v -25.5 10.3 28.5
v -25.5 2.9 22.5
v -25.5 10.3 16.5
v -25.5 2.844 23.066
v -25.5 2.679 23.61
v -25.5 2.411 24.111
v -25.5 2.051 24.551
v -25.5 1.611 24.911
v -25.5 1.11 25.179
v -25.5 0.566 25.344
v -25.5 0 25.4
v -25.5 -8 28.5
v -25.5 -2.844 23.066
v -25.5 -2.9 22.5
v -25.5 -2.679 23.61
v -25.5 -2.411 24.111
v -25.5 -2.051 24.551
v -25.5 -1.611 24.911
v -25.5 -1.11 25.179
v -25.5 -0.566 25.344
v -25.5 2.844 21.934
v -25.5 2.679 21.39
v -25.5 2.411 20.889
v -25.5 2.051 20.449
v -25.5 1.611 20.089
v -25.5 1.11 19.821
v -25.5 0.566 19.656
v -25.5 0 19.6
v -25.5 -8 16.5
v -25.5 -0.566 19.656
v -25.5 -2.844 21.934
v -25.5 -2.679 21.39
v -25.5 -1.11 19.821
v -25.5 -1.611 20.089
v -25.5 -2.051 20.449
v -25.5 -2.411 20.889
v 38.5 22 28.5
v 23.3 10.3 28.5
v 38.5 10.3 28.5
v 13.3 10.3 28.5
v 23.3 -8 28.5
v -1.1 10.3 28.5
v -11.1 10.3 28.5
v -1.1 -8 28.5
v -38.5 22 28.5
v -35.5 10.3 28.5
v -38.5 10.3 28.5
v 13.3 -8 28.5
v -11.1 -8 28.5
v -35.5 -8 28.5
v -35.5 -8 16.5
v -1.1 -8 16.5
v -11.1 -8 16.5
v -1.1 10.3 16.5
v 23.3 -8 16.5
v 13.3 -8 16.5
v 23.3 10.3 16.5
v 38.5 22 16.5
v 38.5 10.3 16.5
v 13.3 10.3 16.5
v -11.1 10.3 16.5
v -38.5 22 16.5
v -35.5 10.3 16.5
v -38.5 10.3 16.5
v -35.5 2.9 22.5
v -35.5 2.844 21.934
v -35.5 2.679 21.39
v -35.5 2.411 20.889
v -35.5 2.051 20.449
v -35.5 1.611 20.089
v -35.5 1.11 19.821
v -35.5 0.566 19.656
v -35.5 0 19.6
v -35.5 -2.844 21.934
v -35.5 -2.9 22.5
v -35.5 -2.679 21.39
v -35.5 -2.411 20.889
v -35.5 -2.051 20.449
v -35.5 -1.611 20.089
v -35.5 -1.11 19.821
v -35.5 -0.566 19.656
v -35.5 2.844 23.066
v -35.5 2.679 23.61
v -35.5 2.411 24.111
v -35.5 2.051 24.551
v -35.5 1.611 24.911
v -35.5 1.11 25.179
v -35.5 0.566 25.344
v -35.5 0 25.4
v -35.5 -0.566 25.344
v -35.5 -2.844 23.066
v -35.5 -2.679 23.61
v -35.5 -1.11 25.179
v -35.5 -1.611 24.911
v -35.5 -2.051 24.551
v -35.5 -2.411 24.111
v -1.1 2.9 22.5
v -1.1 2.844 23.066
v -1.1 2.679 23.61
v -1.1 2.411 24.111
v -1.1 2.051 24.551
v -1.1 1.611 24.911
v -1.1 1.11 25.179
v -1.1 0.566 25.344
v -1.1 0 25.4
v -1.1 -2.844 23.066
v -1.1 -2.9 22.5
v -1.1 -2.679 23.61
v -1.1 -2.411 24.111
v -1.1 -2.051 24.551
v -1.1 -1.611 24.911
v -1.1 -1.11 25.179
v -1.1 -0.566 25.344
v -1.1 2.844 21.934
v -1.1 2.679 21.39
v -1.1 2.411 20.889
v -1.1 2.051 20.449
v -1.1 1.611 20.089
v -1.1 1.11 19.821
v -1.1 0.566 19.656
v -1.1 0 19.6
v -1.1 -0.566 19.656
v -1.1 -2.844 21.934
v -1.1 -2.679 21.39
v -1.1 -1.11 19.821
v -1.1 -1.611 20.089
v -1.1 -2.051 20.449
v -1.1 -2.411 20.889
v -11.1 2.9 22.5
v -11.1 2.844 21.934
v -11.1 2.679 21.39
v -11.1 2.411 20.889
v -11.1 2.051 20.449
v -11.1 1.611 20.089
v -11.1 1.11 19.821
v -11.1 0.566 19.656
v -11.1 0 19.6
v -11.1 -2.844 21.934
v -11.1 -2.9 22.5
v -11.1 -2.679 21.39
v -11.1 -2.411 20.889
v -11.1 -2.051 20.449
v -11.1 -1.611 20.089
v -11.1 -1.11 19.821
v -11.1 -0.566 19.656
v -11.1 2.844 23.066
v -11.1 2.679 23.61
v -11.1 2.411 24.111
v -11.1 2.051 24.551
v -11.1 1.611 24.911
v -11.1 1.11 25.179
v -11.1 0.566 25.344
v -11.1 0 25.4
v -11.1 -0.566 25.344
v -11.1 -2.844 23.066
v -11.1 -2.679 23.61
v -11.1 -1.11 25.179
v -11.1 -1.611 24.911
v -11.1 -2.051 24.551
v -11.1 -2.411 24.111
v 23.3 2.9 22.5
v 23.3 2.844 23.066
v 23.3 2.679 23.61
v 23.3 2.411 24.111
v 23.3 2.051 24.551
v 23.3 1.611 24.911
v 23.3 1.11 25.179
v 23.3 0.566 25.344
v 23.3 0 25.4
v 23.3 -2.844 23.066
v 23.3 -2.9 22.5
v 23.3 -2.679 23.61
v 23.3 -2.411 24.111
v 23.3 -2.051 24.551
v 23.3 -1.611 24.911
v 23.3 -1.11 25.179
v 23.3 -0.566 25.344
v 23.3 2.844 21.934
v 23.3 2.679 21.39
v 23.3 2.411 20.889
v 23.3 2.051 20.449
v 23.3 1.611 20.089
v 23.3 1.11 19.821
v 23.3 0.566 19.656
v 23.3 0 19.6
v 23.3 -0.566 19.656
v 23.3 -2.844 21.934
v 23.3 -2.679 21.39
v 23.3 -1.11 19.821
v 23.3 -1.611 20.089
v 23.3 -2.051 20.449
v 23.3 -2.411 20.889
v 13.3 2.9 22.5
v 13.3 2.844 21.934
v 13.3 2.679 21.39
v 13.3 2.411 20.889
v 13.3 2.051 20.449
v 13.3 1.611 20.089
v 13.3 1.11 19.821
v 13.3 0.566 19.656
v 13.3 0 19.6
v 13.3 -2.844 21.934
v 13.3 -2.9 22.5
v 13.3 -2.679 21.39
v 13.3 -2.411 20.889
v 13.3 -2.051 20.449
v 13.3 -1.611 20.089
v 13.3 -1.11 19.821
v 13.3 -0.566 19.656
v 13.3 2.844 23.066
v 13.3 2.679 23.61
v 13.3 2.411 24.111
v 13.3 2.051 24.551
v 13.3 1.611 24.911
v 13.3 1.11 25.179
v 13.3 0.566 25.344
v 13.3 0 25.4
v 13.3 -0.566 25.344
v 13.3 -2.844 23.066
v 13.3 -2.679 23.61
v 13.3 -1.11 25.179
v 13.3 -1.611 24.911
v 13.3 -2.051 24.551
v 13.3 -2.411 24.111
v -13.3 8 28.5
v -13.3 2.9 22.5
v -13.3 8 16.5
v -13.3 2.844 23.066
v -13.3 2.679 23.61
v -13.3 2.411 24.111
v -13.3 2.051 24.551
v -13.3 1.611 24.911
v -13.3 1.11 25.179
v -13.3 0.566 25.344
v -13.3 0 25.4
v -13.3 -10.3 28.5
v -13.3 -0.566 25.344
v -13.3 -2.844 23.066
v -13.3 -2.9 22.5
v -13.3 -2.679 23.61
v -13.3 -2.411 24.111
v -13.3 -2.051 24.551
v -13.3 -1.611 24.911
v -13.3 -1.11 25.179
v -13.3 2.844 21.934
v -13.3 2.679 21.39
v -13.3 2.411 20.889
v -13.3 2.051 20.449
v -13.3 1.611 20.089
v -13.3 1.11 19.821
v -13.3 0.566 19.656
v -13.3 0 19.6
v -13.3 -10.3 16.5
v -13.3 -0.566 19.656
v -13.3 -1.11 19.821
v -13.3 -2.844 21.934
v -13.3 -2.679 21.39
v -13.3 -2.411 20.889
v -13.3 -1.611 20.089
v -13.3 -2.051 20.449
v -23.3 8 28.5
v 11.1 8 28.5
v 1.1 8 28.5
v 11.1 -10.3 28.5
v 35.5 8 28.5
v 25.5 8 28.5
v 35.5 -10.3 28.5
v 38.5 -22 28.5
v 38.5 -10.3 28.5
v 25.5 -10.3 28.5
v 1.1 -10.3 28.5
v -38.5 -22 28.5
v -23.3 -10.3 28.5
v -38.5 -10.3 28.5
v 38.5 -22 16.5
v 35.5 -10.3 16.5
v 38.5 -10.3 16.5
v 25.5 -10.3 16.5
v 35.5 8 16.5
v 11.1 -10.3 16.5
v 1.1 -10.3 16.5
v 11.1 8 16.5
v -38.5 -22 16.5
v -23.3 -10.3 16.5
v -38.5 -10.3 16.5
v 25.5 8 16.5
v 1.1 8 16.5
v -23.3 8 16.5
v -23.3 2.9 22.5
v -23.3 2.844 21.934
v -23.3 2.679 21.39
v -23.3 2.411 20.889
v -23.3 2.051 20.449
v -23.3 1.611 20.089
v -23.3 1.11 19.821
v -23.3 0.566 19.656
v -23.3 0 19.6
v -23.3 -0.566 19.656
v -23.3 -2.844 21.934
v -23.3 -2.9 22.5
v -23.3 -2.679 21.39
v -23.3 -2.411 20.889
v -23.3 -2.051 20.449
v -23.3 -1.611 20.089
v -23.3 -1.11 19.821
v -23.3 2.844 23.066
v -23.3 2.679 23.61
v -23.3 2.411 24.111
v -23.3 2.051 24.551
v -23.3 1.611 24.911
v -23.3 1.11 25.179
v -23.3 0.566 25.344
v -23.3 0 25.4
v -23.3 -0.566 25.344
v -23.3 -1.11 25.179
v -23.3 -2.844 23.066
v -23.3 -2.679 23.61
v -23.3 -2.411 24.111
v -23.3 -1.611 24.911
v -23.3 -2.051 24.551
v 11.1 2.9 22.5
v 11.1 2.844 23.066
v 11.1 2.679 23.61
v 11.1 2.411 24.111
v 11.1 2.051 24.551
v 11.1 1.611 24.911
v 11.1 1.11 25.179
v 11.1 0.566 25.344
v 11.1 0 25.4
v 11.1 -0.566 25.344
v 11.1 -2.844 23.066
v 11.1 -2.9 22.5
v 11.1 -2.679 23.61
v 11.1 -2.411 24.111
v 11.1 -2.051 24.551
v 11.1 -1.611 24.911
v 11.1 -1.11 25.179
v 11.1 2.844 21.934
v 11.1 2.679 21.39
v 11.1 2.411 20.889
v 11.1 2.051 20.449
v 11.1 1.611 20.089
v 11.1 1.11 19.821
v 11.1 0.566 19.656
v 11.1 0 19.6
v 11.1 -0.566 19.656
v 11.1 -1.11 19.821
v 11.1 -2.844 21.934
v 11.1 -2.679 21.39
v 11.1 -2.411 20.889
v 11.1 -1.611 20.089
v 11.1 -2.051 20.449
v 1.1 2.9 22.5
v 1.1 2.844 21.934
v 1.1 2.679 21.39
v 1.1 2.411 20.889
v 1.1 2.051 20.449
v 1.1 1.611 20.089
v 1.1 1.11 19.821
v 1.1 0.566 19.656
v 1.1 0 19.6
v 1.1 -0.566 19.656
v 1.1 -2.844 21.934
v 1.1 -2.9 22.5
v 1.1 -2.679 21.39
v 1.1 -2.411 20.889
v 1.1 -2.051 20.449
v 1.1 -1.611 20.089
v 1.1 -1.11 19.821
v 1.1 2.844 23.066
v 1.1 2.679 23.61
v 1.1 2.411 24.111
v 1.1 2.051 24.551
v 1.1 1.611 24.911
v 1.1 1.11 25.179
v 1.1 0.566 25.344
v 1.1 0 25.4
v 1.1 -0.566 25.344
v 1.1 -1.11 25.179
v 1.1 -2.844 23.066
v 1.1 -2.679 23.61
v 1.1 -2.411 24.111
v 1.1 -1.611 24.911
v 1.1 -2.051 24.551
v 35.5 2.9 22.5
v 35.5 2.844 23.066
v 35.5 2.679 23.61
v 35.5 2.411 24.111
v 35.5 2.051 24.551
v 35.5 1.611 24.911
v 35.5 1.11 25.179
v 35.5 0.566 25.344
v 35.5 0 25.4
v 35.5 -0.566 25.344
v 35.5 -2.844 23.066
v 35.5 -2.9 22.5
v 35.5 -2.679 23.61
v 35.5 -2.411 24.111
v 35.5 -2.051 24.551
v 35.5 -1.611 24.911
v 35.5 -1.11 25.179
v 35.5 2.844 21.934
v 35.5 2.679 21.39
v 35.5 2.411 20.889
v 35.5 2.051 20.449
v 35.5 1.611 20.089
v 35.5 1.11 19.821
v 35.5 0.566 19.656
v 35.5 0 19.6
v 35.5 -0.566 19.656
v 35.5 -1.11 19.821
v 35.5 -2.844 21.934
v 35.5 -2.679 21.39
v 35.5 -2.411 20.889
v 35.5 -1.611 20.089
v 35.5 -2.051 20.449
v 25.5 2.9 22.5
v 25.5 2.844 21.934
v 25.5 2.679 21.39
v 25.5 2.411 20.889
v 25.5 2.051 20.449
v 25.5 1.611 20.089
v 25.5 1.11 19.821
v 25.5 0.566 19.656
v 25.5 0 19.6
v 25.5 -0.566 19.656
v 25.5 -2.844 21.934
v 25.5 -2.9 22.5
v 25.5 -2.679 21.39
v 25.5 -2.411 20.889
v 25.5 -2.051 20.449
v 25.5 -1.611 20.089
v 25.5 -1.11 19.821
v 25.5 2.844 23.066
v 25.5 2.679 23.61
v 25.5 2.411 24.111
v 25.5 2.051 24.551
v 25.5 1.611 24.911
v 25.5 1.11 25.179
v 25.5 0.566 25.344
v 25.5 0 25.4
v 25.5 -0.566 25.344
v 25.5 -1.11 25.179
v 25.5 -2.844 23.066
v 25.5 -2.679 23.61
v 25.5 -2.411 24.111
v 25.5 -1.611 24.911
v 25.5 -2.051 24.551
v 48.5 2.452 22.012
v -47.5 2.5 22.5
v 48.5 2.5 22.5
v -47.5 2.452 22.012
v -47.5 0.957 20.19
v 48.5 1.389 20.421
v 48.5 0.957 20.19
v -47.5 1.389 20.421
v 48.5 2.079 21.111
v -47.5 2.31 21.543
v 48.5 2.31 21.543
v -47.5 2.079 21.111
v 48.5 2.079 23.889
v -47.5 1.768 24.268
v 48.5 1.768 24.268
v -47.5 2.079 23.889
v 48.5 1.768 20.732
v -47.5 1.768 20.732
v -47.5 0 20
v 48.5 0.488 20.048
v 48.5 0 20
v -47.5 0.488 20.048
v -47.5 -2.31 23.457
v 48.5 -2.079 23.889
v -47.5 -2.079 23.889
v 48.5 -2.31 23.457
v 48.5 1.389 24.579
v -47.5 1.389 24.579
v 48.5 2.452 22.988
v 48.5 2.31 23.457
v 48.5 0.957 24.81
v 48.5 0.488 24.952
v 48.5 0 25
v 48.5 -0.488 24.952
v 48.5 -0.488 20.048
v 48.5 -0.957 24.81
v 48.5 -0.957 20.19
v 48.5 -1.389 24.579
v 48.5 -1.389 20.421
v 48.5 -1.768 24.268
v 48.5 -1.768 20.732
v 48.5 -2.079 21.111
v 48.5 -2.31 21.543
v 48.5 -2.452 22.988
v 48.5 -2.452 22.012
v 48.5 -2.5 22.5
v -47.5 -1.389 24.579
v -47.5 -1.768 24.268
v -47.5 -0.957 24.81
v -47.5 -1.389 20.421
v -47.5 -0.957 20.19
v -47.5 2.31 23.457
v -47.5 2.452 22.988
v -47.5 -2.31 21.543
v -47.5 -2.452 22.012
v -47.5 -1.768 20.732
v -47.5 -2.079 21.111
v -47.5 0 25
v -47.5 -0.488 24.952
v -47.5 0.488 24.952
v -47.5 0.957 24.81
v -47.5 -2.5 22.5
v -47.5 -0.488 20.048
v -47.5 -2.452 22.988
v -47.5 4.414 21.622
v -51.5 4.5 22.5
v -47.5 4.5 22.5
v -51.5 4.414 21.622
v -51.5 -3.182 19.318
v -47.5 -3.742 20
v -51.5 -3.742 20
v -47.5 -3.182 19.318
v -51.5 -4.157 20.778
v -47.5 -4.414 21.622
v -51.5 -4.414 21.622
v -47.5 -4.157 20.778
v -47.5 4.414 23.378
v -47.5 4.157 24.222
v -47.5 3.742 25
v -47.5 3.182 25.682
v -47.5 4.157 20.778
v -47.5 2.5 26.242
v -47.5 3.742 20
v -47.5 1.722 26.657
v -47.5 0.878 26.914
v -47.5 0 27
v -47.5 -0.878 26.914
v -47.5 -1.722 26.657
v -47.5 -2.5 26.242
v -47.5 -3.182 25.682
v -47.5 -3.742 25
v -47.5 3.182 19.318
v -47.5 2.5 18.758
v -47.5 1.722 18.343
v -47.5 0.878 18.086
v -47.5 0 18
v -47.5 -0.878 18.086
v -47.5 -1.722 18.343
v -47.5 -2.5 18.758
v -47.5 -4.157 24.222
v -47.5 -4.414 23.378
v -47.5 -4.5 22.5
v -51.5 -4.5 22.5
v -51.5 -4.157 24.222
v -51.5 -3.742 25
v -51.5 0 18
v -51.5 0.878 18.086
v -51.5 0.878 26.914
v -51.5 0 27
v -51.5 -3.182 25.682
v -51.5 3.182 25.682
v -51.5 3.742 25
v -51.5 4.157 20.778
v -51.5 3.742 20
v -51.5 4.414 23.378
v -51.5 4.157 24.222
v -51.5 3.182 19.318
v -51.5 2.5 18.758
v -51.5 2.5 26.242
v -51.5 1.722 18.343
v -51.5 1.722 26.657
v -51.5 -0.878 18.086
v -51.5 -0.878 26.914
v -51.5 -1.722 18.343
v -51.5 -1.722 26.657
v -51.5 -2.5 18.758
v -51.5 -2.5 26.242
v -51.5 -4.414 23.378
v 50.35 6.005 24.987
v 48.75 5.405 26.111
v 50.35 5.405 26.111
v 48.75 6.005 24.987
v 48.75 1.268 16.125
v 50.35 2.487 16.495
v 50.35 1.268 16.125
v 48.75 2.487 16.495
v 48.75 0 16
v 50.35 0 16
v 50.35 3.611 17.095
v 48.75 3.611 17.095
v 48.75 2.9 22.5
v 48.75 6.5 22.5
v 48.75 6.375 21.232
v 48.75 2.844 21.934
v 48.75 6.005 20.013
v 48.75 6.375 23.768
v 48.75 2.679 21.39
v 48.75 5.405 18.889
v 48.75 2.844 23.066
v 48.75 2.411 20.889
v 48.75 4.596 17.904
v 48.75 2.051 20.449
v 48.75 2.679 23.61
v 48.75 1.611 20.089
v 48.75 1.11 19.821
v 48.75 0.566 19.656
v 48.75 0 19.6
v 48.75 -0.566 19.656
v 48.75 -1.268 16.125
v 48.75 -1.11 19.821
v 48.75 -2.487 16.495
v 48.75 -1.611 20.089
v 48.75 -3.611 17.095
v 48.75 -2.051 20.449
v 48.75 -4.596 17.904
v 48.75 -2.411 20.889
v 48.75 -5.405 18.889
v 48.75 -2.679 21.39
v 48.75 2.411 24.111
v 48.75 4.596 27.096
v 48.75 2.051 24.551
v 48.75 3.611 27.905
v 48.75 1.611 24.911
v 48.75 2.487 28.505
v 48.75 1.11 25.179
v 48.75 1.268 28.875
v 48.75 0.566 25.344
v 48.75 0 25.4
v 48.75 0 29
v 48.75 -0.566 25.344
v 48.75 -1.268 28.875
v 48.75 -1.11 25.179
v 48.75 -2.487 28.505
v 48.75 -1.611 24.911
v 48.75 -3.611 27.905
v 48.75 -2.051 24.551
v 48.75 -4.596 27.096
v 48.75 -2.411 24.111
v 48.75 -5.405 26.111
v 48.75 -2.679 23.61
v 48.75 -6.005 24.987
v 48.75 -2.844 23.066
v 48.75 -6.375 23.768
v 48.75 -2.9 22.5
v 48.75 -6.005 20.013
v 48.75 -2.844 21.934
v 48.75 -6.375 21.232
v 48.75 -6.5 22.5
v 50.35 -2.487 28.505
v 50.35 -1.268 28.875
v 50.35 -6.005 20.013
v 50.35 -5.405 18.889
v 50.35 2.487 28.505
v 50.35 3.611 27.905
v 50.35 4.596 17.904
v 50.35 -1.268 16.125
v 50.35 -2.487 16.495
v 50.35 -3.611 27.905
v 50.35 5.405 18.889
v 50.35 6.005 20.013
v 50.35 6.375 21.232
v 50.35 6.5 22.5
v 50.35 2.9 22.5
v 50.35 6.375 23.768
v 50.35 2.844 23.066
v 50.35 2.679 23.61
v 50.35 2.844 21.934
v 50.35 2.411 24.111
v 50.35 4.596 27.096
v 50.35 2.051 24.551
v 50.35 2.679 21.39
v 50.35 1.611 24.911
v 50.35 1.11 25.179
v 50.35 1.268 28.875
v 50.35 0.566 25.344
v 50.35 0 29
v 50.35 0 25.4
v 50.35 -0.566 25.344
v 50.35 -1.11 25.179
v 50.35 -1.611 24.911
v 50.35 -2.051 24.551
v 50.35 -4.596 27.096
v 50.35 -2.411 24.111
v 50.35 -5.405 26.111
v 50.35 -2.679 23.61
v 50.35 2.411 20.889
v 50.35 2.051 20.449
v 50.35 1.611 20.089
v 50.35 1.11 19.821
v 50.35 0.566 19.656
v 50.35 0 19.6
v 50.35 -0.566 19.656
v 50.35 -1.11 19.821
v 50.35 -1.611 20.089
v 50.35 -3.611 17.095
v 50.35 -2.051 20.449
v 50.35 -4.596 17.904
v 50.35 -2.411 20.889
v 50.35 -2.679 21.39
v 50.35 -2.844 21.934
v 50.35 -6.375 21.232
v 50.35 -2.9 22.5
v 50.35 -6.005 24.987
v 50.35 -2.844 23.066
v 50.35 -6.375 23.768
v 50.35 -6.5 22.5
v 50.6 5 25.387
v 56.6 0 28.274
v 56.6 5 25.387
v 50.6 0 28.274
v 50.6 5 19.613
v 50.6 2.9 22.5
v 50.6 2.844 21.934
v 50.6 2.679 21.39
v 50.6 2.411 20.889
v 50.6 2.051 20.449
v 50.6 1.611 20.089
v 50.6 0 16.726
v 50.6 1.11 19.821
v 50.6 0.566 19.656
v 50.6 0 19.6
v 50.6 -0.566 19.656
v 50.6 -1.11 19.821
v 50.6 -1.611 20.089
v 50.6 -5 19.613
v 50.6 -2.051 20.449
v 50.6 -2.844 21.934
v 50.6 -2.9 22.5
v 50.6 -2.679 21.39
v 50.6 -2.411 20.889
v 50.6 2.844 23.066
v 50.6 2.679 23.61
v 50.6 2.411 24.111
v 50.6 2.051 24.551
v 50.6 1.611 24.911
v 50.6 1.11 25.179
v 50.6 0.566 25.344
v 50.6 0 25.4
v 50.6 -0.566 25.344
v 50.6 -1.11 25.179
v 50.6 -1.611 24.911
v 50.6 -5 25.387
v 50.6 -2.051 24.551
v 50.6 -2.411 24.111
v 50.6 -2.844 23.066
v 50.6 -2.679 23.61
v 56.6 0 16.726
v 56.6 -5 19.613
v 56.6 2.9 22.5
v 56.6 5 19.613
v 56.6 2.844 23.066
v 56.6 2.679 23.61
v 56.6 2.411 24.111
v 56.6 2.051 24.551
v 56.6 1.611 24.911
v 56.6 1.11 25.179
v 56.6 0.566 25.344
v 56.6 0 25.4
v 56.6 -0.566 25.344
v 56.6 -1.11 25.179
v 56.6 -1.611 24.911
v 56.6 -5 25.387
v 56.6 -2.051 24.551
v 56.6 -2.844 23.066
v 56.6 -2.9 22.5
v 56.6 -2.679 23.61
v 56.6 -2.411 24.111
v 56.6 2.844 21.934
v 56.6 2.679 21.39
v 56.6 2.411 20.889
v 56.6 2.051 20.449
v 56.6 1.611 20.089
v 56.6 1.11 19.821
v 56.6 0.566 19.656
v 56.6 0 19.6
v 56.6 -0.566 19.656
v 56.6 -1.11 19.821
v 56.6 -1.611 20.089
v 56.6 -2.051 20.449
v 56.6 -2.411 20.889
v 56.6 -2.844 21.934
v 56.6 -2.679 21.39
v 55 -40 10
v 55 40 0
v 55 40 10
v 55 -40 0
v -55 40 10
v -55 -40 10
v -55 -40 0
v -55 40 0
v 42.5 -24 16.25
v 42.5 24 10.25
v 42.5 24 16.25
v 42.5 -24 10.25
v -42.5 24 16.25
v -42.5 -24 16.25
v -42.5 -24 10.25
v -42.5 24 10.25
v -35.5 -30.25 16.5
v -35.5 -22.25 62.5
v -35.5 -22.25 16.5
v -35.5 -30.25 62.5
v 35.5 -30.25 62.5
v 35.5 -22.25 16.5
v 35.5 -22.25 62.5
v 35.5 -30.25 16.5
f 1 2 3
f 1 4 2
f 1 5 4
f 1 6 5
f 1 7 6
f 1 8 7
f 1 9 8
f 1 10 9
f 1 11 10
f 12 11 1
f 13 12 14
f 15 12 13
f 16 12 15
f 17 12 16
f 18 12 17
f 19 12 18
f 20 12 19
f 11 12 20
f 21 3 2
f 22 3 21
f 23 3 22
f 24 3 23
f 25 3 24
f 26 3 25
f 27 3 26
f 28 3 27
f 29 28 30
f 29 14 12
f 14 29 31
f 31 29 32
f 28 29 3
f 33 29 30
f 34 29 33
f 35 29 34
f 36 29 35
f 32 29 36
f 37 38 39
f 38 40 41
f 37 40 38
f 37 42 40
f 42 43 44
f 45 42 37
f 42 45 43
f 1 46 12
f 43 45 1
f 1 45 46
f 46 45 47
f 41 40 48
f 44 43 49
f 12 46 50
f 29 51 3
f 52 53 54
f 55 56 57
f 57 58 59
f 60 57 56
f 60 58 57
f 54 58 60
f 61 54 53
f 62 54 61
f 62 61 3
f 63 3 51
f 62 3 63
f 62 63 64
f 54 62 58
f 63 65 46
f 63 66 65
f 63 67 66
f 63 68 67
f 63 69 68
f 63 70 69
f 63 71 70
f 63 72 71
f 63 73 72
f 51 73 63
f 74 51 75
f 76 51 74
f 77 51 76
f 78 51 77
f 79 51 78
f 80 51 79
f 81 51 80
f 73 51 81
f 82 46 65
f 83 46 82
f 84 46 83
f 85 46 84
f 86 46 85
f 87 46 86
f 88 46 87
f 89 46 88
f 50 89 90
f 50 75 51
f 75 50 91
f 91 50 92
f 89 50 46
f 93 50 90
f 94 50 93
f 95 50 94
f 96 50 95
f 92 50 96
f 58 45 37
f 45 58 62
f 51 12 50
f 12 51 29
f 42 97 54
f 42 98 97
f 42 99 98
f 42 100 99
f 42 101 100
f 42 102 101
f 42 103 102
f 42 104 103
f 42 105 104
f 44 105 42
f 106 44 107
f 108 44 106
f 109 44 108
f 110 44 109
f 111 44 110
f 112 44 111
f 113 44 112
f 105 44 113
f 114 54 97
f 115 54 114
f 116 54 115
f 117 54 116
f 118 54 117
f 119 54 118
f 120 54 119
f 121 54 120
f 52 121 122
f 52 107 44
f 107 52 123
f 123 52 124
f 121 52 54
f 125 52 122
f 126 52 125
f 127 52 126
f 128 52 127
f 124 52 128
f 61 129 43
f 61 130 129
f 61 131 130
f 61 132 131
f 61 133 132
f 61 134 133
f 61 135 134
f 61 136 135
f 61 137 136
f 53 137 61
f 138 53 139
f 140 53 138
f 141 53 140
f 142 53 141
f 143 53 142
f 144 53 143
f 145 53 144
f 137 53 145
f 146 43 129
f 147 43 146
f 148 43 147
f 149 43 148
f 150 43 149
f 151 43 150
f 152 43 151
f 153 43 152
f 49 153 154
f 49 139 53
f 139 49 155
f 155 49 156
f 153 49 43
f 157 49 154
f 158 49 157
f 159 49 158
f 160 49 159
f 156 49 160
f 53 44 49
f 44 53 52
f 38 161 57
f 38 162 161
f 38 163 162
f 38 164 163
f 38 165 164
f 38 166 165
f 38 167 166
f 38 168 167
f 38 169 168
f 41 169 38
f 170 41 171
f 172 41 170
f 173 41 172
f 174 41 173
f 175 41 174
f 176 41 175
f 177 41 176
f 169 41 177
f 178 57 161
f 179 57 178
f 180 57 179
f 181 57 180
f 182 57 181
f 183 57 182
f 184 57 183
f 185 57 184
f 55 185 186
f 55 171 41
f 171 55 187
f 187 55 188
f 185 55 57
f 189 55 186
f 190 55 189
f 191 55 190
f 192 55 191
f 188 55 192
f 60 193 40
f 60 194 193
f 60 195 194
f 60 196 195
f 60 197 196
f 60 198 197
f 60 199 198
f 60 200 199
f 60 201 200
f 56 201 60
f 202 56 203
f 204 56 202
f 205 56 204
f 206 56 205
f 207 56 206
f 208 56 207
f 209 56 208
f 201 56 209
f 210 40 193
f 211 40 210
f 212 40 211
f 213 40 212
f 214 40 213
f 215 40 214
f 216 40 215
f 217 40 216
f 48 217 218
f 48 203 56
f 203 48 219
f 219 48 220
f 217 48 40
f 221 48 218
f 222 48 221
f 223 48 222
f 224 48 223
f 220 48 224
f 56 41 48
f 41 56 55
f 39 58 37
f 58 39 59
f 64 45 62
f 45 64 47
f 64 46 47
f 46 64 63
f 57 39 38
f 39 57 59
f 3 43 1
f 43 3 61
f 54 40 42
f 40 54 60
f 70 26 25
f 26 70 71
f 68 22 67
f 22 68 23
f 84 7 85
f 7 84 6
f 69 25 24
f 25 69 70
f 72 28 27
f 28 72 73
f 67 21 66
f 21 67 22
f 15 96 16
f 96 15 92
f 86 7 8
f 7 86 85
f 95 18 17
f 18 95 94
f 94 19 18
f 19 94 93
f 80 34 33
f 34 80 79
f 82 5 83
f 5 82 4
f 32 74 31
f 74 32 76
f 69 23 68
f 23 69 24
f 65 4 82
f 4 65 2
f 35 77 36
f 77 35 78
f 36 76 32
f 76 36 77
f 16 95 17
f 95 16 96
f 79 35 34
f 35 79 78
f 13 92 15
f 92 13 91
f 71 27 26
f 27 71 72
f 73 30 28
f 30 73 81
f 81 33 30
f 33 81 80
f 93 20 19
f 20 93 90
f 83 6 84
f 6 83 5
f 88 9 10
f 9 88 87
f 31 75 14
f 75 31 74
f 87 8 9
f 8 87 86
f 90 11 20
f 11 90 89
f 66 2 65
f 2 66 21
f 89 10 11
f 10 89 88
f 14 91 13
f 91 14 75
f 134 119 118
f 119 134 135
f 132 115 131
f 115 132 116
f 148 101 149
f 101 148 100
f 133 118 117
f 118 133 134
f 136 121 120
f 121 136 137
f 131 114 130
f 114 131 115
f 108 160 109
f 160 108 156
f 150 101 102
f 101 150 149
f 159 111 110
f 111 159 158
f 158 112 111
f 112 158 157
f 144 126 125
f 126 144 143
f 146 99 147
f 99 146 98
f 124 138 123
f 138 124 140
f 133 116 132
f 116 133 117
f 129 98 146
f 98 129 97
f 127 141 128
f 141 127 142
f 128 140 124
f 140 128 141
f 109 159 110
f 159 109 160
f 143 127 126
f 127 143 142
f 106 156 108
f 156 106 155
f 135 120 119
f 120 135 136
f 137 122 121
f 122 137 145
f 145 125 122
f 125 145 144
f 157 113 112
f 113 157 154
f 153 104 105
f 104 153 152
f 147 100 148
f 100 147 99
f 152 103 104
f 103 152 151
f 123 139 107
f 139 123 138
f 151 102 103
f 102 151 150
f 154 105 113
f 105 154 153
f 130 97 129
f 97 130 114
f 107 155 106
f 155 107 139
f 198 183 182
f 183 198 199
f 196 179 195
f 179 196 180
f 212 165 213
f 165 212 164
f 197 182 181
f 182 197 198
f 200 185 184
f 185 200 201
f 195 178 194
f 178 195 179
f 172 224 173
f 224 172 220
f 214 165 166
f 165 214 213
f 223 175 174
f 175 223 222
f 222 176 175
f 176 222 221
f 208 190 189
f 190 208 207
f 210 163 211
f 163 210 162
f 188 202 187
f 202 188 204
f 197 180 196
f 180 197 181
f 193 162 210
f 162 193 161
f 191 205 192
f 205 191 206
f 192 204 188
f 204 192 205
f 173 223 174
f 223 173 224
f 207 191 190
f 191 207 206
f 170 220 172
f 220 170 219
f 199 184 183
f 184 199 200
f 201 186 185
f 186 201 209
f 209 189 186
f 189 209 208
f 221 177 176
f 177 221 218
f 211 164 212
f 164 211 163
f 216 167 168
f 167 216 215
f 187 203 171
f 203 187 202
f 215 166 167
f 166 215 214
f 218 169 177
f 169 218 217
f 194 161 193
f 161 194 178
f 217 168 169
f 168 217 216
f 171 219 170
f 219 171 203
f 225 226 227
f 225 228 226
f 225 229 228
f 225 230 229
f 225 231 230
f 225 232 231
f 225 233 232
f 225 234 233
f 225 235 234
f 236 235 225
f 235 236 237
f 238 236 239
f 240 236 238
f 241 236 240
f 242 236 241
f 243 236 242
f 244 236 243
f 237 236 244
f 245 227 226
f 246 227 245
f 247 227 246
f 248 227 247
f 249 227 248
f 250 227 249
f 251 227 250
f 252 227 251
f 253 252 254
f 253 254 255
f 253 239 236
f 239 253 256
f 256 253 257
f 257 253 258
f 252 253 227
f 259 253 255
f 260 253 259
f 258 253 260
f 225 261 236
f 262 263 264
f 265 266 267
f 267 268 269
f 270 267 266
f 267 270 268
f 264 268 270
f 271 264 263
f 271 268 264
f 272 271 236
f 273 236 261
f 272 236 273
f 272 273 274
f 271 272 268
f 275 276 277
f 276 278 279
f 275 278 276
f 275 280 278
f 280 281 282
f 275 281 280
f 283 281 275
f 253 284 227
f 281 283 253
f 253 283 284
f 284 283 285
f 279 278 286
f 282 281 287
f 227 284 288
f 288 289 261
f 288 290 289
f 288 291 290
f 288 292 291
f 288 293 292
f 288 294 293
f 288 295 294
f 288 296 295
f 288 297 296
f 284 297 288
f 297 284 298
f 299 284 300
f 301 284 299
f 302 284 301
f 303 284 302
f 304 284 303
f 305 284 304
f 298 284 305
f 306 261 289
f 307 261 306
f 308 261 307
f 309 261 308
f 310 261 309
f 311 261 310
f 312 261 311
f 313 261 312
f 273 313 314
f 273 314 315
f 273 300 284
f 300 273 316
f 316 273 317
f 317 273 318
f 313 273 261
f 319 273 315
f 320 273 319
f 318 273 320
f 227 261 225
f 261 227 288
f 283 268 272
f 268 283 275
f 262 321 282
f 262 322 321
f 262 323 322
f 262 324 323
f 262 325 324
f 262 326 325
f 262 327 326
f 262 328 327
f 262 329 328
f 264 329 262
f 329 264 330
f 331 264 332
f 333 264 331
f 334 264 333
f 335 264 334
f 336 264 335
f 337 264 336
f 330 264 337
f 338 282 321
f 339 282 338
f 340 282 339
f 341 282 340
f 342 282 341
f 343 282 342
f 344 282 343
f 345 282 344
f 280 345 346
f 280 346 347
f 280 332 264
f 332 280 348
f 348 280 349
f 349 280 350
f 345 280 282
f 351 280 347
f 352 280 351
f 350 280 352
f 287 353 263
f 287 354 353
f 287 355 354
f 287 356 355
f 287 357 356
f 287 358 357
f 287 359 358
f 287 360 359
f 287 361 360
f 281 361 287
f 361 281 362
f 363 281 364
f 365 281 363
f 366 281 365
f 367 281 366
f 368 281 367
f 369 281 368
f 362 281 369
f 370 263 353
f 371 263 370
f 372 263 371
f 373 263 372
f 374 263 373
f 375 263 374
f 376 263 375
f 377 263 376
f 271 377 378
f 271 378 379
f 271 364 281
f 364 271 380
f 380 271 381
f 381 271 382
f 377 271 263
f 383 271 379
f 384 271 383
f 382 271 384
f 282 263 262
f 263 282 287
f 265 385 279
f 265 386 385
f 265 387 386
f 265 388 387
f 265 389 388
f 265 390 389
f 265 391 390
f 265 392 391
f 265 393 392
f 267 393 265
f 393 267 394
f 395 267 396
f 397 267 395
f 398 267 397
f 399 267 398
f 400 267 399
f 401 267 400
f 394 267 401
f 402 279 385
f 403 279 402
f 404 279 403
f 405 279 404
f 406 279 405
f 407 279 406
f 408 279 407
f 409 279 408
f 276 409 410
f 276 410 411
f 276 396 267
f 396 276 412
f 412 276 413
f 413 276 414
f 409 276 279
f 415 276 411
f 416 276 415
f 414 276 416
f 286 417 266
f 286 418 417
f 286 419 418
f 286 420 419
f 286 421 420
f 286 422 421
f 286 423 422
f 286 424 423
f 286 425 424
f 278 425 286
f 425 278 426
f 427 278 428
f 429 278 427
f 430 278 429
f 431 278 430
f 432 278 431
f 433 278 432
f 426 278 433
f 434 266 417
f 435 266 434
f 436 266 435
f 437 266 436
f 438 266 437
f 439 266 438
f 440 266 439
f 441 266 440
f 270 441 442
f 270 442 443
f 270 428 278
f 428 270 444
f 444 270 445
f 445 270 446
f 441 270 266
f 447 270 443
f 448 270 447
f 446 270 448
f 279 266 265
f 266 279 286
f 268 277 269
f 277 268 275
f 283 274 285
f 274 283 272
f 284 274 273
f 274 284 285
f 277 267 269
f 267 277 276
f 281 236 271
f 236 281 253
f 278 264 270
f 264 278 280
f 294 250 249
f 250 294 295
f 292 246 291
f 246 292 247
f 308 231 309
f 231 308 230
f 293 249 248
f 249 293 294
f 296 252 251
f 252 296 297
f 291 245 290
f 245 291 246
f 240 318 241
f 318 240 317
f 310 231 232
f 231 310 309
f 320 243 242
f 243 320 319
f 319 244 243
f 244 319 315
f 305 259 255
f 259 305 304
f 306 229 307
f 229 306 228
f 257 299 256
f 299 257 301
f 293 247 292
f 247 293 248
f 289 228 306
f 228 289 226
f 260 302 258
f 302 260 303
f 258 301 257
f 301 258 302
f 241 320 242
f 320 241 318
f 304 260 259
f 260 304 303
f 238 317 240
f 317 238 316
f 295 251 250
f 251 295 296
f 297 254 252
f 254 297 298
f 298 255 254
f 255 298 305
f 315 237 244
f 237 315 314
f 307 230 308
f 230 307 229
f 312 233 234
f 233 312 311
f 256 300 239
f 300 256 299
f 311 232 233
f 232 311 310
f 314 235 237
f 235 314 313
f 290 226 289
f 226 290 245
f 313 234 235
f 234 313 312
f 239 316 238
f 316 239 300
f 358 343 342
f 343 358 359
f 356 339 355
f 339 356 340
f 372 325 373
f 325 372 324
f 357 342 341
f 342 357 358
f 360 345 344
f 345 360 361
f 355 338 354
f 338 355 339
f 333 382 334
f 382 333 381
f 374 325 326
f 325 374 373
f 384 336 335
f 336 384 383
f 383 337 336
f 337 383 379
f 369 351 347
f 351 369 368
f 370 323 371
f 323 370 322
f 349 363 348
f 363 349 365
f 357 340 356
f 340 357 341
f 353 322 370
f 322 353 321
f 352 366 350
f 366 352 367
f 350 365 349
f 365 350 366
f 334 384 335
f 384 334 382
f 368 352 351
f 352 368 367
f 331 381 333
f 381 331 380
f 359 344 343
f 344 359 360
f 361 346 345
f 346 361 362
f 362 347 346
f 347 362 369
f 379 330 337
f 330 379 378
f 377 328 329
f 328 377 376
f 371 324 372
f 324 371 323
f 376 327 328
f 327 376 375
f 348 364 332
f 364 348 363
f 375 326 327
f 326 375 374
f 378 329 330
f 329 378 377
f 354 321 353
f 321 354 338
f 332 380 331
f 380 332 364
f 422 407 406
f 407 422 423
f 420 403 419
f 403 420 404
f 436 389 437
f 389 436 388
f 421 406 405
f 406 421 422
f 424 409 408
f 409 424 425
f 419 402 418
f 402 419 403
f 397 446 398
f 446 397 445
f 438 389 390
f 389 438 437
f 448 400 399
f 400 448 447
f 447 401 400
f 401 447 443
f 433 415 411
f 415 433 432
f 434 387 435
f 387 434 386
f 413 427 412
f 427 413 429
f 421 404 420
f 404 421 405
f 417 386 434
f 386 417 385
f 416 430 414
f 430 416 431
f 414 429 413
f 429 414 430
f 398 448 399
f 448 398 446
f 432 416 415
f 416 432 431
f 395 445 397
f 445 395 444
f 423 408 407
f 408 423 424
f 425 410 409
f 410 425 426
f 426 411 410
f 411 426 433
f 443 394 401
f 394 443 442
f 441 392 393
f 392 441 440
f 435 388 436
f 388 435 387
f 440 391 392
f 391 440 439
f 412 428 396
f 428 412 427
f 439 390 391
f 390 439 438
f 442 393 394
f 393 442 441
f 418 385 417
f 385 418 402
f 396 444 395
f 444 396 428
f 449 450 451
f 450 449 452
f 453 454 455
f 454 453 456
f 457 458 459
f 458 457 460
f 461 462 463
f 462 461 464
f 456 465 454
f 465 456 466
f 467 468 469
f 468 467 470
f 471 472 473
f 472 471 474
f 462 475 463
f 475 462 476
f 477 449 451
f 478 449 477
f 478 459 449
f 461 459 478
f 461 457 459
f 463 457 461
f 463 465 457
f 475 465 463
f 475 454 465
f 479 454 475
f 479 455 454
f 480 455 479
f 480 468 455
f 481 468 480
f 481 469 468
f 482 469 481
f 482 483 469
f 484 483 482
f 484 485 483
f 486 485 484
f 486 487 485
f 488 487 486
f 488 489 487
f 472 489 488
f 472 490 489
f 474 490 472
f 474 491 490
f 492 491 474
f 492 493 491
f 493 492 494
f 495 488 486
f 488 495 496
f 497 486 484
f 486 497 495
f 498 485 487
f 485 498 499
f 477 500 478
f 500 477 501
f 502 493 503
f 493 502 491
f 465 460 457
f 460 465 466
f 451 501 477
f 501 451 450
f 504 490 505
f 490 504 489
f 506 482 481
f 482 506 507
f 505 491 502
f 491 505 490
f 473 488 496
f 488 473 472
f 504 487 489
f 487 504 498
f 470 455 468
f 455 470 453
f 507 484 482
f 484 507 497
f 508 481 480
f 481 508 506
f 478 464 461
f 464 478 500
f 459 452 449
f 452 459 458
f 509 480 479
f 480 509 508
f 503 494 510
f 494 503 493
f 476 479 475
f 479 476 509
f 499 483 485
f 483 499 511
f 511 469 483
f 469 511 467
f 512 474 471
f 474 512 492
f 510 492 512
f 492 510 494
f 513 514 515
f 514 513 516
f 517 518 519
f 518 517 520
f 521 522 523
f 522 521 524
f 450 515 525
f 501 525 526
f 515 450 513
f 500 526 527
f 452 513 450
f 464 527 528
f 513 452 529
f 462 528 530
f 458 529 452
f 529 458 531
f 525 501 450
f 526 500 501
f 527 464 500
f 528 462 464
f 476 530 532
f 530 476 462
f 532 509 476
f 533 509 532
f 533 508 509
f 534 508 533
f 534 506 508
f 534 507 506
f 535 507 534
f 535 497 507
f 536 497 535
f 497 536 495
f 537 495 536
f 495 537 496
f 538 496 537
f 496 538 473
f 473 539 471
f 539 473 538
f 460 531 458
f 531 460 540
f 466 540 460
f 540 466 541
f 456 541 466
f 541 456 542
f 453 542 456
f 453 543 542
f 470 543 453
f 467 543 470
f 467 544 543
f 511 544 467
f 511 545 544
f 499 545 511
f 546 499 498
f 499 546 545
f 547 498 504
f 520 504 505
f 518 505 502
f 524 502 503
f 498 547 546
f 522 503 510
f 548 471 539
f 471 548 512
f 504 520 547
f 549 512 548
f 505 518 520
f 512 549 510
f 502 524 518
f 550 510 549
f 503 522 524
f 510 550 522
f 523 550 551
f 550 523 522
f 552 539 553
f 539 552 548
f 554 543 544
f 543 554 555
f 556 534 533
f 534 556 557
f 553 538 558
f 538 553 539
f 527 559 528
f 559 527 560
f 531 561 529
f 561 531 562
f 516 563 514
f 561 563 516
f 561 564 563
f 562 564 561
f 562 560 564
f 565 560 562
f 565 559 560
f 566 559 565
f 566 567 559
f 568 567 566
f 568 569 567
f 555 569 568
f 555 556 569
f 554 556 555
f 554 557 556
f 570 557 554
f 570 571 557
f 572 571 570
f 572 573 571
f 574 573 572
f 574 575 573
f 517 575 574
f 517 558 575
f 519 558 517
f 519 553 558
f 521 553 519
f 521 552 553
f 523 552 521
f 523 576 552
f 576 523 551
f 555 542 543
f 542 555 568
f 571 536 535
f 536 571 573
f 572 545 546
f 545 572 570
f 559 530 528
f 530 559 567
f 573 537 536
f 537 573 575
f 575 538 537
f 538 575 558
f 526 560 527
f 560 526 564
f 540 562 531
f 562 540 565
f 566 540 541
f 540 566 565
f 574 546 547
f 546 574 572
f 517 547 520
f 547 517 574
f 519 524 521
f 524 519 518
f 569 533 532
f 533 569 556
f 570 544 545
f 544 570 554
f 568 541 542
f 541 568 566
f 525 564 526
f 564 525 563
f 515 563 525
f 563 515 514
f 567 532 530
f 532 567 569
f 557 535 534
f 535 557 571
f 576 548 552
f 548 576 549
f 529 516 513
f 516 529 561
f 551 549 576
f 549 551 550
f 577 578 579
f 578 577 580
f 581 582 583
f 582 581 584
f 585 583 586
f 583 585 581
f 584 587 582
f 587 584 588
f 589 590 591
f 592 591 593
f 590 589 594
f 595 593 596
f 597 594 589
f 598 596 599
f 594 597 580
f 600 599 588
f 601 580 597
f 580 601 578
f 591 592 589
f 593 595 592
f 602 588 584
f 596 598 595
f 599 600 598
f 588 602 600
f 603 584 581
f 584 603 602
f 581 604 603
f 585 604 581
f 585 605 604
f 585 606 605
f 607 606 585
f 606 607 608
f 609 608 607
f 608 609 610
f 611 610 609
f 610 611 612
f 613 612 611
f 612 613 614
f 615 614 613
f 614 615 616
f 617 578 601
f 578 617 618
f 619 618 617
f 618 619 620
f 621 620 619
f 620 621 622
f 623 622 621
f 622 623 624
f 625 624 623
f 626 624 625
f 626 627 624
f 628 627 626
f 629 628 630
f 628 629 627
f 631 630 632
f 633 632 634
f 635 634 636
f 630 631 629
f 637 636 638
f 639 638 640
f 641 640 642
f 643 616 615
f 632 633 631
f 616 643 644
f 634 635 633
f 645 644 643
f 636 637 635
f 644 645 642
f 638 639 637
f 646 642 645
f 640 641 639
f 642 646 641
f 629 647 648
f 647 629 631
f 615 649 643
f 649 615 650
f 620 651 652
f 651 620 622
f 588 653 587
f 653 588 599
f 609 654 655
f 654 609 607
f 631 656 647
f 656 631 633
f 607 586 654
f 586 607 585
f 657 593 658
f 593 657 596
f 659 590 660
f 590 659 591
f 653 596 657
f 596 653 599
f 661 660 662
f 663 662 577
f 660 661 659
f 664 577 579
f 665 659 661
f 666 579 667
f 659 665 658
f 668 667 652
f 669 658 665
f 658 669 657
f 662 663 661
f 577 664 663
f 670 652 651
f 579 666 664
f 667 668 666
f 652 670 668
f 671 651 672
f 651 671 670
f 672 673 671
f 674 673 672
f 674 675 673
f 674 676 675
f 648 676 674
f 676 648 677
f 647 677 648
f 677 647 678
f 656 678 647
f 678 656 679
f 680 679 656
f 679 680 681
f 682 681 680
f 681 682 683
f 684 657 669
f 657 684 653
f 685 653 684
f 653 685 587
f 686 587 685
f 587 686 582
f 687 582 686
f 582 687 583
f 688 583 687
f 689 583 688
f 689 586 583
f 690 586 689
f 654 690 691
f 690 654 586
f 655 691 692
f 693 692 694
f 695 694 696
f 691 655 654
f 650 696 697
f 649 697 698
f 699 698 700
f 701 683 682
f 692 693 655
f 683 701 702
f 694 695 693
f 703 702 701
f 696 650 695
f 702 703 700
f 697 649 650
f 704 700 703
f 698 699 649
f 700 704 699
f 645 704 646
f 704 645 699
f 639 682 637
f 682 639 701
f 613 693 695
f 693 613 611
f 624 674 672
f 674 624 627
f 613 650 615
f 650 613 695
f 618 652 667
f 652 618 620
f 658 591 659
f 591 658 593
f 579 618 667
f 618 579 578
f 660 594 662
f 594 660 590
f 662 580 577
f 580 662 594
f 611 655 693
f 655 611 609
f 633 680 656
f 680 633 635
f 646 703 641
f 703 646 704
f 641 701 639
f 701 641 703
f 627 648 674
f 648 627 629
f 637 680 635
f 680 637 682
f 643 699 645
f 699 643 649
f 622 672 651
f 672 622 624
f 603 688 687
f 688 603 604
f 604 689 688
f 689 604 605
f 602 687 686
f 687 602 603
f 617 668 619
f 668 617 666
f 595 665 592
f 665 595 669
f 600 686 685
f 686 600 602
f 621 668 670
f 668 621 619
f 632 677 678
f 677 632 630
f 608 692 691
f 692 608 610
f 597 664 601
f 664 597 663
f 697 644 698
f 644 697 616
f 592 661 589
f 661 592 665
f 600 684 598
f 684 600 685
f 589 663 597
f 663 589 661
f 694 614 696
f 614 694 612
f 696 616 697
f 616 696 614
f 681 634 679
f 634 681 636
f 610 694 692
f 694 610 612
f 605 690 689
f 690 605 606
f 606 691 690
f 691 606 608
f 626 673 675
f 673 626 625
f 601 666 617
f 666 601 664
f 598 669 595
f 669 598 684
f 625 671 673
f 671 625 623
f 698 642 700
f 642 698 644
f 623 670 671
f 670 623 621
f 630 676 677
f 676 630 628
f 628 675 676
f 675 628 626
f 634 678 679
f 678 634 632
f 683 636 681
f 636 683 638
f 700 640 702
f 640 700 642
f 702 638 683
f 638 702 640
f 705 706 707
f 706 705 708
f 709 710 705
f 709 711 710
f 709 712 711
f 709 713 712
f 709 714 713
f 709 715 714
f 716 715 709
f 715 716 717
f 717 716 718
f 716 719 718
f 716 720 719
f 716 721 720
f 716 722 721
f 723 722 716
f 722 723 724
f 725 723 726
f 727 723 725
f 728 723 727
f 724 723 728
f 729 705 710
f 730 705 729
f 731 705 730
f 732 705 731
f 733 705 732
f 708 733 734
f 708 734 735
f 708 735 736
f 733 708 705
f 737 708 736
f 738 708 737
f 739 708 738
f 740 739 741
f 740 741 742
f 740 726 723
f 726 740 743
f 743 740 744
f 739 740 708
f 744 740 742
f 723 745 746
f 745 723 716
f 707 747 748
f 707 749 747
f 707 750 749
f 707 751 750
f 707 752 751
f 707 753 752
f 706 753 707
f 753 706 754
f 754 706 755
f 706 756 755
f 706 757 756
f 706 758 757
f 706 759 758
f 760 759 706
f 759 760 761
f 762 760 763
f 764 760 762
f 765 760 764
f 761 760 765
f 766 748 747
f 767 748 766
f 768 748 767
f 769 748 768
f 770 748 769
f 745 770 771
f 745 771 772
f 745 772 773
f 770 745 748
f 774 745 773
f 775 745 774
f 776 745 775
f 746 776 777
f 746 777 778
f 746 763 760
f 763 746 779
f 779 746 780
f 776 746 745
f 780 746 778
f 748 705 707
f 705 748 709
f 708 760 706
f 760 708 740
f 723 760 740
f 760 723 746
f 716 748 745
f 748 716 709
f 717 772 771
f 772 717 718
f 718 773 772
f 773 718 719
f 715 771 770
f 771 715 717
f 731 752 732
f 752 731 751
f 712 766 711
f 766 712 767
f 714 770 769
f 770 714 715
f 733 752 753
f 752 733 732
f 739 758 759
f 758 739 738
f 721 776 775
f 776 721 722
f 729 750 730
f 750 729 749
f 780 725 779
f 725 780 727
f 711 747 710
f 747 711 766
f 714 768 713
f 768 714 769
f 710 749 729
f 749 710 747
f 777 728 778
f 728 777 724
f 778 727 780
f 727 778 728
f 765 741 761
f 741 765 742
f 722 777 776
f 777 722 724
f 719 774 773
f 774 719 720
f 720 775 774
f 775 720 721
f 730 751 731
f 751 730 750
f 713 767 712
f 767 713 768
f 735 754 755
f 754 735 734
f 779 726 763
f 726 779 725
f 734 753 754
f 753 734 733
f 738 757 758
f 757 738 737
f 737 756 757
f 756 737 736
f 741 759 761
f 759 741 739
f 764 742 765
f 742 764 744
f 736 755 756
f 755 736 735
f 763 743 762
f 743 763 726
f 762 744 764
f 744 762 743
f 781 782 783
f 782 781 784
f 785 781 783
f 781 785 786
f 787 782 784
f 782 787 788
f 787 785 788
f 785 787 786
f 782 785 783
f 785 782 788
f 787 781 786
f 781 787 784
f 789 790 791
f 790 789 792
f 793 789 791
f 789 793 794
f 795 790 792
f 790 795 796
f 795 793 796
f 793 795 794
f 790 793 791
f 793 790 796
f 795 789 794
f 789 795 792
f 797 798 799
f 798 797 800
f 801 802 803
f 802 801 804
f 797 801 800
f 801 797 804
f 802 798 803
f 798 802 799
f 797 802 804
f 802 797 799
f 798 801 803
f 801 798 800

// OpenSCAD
$fn = 32;

// ------------------------------------------------------------------------
// Comb hinge with flap: leaf 77 x 22 mm, pin d5, flap 46 mm
// Every part is its own module, assembly() places every instance.
// ------------------------------------------------------------------------

// --- part 1 ---
module hinge_bed() {
  difference() {
    translate([-55, -40, 0]) cube([110, 80, 10]);
  }
}

// --- part 2 ---
module hinge_riser() {
  difference() {
    translate([-42.5, -24, 0]) cube([85, 48, 6]);
  }
}

// --- part 3 ---
module hinge_leaf_a() {
  difference() {
    union() {
      translate([-35.5, -8, -6]) cube([10, 30, 12]);
      translate([-11.1, -8, -6]) cube([10, 30, 12]);
      translate([13.3, -8, -6]) cube([10, 30, 12]);
      translate([-38.5, 10.3, -6]) cube([77, 11.7, 12]);
    }
    translate([-30.5, 0, 0]) rotate([0, 90, 0]) cylinder(h = 12, d = 5.8, center = true);
    translate([-6.1, 0, 0]) rotate([0, 90, 0]) cylinder(h = 12, d = 5.8, center = true);
    translate([18.3, 0, 0]) rotate([0, 90, 0]) cylinder(h = 12, d = 5.8, center = true);
  }
}

// --- part 4 ---
module hinge_leaf_b() {
  difference() {
    union() {
      translate([-23.3, -22, -6]) cube([10, 30, 12]);
      translate([1.1, -22, -6]) cube([10, 30, 12]);
      translate([25.5, -22, -6]) cube([10, 30, 12]);
      translate([-38.5, -22, -6]) cube([77, 11.7, 12]);
    }
    translate([-18.3, 0, 0]) rotate([0, 90, 0]) cylinder(h = 12, d = 5.8, center = true);
    translate([6.1, 0, 0]) rotate([0, 90, 0]) cylinder(h = 12, d = 5.8, center = true);
    translate([30.5, 0, 0]) rotate([0, 90, 0]) cylinder(h = 12, d = 5.8, center = true);
  }
}

// --- part 5 ---
module hinge_flap() {
  difference() {
    translate([-35.5, -23, 0]) cube([71, 46, 8]);
  }
}

// --- part 6 ---
module hinge_pin() {
  rotate([0, 90, 0]) cylinder(h = 97, d = 5, center = true);
  translate([-51.5, 0, 0]) rotate([0, 90, 0]) cylinder(h = 4, d = 9);
}

// --- part 7 ---
module pin_washer() {
  difference() {
      translate([0, 0, 0]) cylinder(h = 1.6, d = 13);
      translate([0, 0, -1]) cylinder(h = 3.6, d = 5.8);
    }
}

// --- part 8 ---
module pin_nut() {
  difference() {
    linear_extrude(height = 6) polygon(points = [[5.774, 0], [2.887, 5], [-2.887, 5], [-5.774, 0], [-2.887, -5], [2.887, -5]]);
    translate([0, 0, -1]) cylinder(h = 8, d = 5.8);
  }
}

// --- assembly ---
module assembly() {
  color([0.80, 0.24, 0.20]) translate([0, 0, 0]) rotate([0, 0, 0]) hinge_bed();
  color([0.20, 0.45, 0.75]) translate([0, 0, 10.25]) rotate([0, 0, 0]) hinge_riser();
  color([0.25, 0.62, 0.32]) translate([0, 0, 22.5]) rotate([0, 0, 0]) hinge_leaf_a();
  color([0.92, 0.70, 0.18]) translate([0, 0, 22.5]) rotate([0, 0, 0]) hinge_leaf_b();
  color([0.58, 0.35, 0.70]) translate([0, -22.25, 39.5]) rotate([90, 0, 0]) hinge_flap();
  color([0.16, 0.66, 0.66]) translate([0, 0, 22.5]) rotate([0, 0, 0]) hinge_pin();
  color([0.85, 0.48, 0.18]) translate([48.75, 0, 22.5]) rotate([0, 90, 0]) pin_washer();
  color([0.55, 0.60, 0.65]) translate([50.6, 0, 22.5]) rotate([0, 90, 0]) pin_nut();
}

assembly();
